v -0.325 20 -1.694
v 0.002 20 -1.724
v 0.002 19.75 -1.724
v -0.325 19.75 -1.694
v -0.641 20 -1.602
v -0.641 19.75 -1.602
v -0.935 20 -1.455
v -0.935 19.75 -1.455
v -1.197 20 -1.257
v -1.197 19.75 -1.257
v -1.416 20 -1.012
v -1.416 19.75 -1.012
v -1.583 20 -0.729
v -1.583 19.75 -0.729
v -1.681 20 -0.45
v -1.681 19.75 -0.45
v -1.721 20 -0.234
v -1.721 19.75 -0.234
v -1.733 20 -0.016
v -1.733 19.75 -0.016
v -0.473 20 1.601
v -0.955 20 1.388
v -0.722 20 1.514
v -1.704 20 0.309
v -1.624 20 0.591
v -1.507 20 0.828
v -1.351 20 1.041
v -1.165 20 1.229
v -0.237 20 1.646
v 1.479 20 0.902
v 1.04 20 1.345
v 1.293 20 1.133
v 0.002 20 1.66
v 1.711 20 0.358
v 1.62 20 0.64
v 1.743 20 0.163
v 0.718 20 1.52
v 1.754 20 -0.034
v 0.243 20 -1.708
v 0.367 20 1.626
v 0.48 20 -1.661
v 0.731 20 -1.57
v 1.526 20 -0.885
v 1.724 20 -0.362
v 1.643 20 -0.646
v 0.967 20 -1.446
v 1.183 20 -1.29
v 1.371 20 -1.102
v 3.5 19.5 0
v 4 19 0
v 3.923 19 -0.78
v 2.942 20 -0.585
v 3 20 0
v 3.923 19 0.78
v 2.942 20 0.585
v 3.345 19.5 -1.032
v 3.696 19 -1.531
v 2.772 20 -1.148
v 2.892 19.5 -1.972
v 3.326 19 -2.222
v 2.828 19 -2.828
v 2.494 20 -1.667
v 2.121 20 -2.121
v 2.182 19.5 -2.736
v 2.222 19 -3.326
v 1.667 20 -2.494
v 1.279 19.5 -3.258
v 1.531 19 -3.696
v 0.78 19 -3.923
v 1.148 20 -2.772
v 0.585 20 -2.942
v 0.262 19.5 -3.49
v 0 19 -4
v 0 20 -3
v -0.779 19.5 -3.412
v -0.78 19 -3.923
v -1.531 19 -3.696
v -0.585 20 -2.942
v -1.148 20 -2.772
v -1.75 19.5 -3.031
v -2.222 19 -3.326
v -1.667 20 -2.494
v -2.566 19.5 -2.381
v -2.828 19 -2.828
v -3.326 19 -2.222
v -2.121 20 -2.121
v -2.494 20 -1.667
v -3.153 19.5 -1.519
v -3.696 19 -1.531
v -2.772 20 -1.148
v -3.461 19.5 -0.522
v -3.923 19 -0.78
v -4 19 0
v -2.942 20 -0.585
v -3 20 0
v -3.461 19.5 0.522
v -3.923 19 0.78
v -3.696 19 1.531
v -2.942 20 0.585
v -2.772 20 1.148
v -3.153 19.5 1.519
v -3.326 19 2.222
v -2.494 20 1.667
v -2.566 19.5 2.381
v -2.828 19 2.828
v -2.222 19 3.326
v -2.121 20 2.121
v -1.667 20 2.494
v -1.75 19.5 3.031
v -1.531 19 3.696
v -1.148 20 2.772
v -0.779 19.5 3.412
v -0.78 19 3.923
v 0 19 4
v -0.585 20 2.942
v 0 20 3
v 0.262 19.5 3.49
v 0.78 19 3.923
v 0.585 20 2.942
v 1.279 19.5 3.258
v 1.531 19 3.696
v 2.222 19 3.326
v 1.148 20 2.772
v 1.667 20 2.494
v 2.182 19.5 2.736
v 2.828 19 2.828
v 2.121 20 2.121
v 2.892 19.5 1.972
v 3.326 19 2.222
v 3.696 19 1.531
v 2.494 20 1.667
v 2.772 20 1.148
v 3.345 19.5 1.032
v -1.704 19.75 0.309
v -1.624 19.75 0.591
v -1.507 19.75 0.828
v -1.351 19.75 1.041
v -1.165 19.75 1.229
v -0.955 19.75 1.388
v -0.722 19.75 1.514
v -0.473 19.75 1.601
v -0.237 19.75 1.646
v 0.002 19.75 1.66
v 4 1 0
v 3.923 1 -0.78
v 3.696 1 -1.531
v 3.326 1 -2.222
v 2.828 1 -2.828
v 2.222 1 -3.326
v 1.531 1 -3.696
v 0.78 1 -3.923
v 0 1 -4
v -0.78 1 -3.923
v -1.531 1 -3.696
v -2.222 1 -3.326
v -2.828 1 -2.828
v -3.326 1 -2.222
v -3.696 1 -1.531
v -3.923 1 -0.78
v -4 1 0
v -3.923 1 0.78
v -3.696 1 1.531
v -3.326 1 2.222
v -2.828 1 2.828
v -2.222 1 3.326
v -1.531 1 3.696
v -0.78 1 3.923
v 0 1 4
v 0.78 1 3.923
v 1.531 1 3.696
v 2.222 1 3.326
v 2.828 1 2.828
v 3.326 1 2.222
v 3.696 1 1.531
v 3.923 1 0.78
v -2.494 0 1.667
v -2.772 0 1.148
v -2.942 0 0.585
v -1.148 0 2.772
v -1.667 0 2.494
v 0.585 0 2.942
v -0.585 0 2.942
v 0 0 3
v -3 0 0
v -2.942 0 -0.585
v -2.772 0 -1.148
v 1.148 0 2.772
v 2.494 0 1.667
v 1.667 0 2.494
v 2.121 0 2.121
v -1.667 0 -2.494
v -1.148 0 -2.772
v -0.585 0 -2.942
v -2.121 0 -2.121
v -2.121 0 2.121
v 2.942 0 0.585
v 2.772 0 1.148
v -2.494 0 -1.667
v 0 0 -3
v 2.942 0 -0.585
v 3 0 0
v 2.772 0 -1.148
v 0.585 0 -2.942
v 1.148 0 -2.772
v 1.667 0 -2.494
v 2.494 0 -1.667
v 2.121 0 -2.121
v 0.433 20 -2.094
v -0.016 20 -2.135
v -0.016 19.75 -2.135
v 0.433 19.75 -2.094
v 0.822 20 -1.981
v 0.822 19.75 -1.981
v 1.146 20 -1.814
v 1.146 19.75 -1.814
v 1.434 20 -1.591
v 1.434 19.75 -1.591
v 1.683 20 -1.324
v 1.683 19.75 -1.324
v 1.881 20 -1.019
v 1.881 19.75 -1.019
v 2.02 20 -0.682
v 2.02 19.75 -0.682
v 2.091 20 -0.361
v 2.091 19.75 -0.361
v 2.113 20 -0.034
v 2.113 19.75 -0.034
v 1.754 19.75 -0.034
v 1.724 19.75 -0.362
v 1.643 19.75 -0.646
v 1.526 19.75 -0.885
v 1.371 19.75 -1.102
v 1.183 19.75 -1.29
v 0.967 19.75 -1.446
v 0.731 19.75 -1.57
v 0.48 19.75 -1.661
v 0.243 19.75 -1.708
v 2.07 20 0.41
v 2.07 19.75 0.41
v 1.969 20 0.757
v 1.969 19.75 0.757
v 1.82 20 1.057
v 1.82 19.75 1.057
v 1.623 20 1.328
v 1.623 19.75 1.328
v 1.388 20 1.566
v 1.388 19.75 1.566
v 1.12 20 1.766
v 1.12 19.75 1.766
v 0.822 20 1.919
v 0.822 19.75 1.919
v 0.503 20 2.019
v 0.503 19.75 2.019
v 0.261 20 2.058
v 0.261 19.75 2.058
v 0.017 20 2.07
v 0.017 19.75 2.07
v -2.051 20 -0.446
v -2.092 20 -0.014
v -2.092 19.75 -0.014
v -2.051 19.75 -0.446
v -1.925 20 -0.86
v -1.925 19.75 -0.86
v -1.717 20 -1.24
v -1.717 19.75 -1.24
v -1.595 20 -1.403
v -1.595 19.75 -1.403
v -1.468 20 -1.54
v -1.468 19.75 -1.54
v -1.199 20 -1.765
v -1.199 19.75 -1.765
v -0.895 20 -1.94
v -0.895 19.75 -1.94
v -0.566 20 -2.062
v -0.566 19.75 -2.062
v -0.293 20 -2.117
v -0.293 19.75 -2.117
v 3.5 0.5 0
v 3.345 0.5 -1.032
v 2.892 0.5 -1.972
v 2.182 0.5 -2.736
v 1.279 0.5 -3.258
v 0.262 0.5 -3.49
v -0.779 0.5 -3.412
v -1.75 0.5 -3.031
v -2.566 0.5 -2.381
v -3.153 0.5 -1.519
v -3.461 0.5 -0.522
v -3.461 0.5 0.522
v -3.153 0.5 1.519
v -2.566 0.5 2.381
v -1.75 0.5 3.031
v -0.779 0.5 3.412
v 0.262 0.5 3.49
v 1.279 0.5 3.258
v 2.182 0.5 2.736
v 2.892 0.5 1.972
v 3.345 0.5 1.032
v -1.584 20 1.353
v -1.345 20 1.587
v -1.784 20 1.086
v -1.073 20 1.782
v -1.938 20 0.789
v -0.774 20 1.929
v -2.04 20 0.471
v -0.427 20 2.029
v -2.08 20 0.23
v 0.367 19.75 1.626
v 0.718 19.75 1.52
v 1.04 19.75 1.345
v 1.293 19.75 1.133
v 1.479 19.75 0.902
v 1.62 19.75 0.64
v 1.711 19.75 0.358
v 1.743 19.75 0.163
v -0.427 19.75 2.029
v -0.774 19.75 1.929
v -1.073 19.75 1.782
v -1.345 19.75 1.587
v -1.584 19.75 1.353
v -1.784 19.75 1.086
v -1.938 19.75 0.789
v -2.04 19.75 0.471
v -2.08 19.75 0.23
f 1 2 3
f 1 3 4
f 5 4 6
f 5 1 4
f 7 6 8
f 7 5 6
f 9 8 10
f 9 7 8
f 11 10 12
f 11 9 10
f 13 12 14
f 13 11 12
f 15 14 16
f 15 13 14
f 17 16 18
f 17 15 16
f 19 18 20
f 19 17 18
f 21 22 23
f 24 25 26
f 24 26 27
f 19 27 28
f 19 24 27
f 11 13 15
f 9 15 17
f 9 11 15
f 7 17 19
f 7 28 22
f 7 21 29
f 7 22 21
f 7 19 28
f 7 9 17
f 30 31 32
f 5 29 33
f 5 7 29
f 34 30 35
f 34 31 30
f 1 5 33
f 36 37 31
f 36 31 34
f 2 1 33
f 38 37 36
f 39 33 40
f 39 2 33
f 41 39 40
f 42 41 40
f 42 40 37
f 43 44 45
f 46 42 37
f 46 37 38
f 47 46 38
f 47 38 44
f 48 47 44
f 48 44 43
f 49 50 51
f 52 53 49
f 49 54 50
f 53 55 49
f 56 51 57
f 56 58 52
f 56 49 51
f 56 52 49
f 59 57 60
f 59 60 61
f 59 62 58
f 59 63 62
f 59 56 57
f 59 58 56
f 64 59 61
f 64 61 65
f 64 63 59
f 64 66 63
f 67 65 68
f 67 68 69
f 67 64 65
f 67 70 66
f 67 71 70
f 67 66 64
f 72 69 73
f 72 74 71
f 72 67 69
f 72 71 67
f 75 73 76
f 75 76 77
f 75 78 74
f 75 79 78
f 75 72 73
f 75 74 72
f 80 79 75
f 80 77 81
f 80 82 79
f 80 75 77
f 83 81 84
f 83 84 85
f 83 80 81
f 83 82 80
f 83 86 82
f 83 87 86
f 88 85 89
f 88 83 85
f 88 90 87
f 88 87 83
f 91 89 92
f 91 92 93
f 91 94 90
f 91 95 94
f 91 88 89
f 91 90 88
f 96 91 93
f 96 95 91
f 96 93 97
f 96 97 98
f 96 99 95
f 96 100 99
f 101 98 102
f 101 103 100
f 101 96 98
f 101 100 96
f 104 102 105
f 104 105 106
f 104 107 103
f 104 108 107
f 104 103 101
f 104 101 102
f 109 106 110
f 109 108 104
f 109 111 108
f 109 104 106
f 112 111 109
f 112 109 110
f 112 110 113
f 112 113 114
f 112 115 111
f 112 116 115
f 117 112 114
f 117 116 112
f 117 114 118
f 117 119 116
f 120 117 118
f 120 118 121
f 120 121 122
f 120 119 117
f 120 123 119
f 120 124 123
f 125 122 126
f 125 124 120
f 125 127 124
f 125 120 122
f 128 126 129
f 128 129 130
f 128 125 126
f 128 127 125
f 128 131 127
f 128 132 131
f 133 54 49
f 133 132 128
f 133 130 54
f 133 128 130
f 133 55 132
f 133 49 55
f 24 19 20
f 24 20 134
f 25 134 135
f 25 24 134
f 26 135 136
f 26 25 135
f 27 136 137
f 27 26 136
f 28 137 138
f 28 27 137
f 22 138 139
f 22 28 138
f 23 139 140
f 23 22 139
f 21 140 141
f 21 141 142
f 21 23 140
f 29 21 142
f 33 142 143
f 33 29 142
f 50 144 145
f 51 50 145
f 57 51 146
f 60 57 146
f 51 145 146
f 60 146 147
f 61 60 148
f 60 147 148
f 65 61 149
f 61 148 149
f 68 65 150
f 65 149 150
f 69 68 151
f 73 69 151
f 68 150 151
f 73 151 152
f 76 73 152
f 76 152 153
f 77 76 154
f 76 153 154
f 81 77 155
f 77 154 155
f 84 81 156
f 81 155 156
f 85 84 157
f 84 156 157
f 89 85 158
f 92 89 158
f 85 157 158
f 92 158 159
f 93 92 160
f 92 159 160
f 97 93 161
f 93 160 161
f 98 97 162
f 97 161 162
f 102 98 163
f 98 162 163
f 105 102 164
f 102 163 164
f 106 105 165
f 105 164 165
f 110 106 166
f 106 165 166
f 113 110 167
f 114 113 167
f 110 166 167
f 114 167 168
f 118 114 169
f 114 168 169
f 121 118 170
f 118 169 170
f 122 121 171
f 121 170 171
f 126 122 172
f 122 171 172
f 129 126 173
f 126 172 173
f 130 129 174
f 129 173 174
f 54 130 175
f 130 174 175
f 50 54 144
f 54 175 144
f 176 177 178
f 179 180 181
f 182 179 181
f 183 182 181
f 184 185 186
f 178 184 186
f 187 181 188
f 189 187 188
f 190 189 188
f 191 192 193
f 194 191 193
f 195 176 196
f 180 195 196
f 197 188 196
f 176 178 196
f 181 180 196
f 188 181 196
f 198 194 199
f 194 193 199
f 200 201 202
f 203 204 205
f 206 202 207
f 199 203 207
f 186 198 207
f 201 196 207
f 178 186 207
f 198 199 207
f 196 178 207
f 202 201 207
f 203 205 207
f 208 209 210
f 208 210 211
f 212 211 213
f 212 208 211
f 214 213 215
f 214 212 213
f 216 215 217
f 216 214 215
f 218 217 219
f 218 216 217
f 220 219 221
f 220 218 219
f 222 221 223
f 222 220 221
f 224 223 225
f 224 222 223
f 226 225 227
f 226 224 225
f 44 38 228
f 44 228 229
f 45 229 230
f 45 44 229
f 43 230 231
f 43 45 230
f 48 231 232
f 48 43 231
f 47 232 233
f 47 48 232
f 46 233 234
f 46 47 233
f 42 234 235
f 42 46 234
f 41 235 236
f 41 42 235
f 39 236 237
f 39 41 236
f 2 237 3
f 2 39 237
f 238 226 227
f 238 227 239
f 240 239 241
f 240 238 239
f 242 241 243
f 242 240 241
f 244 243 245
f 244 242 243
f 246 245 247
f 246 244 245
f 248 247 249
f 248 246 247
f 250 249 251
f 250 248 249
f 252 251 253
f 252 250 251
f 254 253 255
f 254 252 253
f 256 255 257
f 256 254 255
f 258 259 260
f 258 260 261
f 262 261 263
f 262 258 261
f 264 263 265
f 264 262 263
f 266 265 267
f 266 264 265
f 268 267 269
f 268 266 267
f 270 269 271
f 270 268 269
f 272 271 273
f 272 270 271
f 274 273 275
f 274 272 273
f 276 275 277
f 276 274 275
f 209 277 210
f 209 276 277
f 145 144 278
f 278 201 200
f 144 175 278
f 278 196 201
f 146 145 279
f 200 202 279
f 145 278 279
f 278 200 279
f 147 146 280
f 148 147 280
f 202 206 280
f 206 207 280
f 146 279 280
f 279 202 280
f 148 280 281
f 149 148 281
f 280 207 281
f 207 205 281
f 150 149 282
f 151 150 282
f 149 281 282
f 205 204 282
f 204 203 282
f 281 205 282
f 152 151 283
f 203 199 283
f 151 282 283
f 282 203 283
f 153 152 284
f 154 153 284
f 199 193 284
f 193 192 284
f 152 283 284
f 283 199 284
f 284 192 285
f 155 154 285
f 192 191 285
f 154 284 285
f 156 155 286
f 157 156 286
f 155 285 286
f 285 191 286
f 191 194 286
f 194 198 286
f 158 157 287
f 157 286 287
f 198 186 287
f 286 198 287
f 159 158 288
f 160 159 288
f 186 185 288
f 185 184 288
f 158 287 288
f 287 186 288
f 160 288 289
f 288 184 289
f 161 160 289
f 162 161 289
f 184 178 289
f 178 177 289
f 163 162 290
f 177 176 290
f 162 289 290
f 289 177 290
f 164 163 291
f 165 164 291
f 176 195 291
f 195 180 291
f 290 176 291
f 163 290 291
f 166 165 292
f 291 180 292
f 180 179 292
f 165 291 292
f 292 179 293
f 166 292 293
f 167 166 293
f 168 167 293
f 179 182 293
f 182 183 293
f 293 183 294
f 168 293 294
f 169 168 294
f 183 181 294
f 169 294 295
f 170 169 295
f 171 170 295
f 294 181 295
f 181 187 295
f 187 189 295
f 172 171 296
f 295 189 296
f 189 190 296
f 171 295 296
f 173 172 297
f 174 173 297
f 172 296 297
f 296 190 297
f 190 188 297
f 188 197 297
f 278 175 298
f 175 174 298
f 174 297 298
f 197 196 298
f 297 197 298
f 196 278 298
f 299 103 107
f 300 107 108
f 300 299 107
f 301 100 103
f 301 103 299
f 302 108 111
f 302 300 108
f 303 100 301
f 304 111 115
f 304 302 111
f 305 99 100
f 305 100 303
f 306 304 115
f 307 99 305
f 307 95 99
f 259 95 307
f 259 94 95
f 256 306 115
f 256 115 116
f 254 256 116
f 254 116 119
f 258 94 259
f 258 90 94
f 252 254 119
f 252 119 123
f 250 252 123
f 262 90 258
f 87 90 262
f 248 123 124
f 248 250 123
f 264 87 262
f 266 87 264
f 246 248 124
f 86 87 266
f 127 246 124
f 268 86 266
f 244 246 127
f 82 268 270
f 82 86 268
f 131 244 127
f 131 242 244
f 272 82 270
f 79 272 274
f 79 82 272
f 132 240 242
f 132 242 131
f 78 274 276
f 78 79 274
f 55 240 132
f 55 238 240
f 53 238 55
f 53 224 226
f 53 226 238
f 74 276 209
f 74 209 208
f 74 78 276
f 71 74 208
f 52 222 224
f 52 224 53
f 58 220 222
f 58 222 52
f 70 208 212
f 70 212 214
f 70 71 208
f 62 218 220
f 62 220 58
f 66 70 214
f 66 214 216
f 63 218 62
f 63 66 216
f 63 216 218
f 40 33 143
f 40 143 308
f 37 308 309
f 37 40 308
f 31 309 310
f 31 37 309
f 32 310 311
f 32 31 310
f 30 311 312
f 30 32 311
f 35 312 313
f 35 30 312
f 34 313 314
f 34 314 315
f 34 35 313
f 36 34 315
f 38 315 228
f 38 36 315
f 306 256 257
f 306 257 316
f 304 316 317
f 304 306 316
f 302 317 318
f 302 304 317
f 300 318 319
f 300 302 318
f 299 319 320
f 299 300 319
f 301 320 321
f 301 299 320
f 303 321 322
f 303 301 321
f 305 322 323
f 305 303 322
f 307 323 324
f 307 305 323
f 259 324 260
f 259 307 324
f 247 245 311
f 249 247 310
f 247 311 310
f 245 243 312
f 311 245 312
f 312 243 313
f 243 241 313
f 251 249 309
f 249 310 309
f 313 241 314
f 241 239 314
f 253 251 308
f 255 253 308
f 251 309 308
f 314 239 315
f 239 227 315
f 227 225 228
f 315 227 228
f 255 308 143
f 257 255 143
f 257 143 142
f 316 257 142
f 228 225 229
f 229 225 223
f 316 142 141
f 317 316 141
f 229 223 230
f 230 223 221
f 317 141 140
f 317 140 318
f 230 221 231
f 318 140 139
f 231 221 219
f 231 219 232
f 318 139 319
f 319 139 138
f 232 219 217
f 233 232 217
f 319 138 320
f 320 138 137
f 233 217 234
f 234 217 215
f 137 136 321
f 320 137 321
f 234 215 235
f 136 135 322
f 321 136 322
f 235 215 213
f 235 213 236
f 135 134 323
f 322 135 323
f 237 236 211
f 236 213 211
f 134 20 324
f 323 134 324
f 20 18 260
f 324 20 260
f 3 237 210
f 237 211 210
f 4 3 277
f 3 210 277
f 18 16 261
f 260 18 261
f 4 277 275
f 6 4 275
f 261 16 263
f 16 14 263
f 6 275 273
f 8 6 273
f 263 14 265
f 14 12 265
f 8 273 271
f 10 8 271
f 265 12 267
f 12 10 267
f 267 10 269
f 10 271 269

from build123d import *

# Parameters (mm, degrees)
CROQUIS1_R              = 4
SALIENTE_EXTRUIR1_DEPTH = 20
CHAFL_N1_SIZE           = 1
CORTAR_EXTRUIR2_DEPTH   = 0.25


with BuildPart() as part:
    # Croquis1 → Saliente-Extruir1 (new body)
    with BuildSketch(Plane(origin=(0, 0, 0), x_dir=(1, 0, 0), z_dir=(0, 1, 0))):
        Circle(CROQUIS1_R)
    extrude(amount=SALIENTE_EXTRUIR1_DEPTH)

    # Chaflán1
    chafl_n1_edges = [part.edges().sort_by_distance(p)[0] for p in [
        (-4, 0, 0),
        (-4, 20, 0),
    ]]
    chamfer(chafl_n1_edges, length=CHAFL_N1_SIZE)

    # Croquis4 → Cortar-Extruir2 (cut)
    with BuildSketch(Plane(origin=(0, 20, 0), x_dir=(1, 0, 0), z_dir=(0, 1, 0))):
        with BuildLine():
            add(Edge.make_bspline(
                [(-0.015518725, 2.134649306), (0.058547681, 2.13277333), (0.204020215, 2.129088757), (0.417820098, 2.100884068), (0.621928779, 2.052089336), (0.818008937, 1.98710307), (1.003715196, 1.900412344), (1.180445359, 1.795629318), (1.347778929, 1.671656222), (1.503460508, 1.529451391), (1.645925594, 1.374727444), (1.771440893, 1.209609832), (1.876632085, 1.035096915), (1.963015842, 0.851713109), (2.030785682, 0.659873146), (2.077550303, 0.458554285), (2.107422475, 0.249060925), (2.110914792, 0.10617308), (2.112686403, 0.033687768)],
                knots=[0, 0, 0, 0, 0.000222163, 0.000436347, 0.000645474, 0.000850973, 0.001054962, 0.001259031, 0.001466406, 0.001678557, 0.001890656, 0.002096587, 0.002299693, 0.002500778, 0.002703768, 0.002908812, 0.003119927, 0.003337287, 0.003337287, 0.003337287, 0.003337287], degree=3))
            add(Edge.make_bspline(
                [(2.112686403, 0.033687768), (2.110915051, -0.0382636), (2.107423512, -0.18008808), (2.077516338, -0.388252016), (2.030612338, -0.588355669), (1.963645177, -0.780064987), (1.877673201, -0.963582203), (1.771781577, -1.138424436), (1.647048765, -1.304649005), (1.505098078, -1.460434908), (1.35035403, -1.60328916), (1.184376582, -1.727767875), (1.010898502, -1.834881161), (0.827687407, -1.920348217), (0.63717308, -1.988658983), (0.437650425, -2.035233417), (0.230054363, -2.065275752), (0.088487501, -2.068725485), (0.016532557, -2.070478899)],
                knots=[0, 0, 0, 0, 0.000215759, 0.000425286, 0.000629551, 0.00083152, 0.00103333, 0.001236435, 0.001443647, 0.001655798, 0.001867897, 0.002074468, 0.002277305, 0.00247839, 0.002679869, 0.002883353, 0.003092087, 0.003307846, 0.003307846, 0.003307846, 0.003307846], degree=3))
            add(Edge.make_bspline(
                [(0.016532557, -2.070478899), (-0.055952379, -2.068708171), (-0.198839483, -2.065217595), (-0.408596095, -2.03529599), (-0.610056374, -1.988505928), (-0.802644204, -1.921638001), (-0.98646698, -1.835218309), (-1.161884218, -1.729841876), (-1.328191815, -1.604805143), (-1.484010953, -1.462900486), (-1.626581466, -1.308418712), (-1.750877895, -1.142893849), (-1.856278024, -0.969573328), (-1.942407547, -0.787976157), (-2.010595501, -0.598980223), (-2.057115293, -0.40132482), (-2.087213524, -0.196136813), (-2.09068192, -0.056430644), (-2.092441802, 0.014456999)],
                knots=[0, 0, 0, 0, 0.00021736, 0.000428475, 0.000634298, 0.000837024, 0.001038834, 0.001242626, 0.001449838, 0.001661989, 0.001874088, 0.002079537, 0.002281957, 0.002481593, 0.002681563, 0.002883489, 0.003089842, 0.003302399, 0.003302399, 0.003302399, 0.003302399], degree=3))
            add(Edge.make_bspline(
                [(-2.092441802, 0.014456999), (-2.09183079, 0.062037192), (-2.090616474, 0.156597333), (-2.075997397, 0.297016305), (-2.054784025, 0.435177056), (-2.024381839, 0.570686711), (-1.984619934, 0.703213551), (-1.937703331, 0.833671565), (-1.88040065, 0.960738678), (-1.815622767, 1.08501684), (-1.743323558, 1.204568733), (-1.663465558, 1.317573971), (-1.578853709, 1.424980824), (-1.486095545, 1.524005971), (-1.388248179, 1.61753015), (-1.283724318, 1.704116112), (-1.173161753, 1.784544628), (-1.056084748, 1.857025017), (-0.935378148, 1.922578314), (-0.810947544, 1.978831858), (-0.684482891, 2.027113071), (-0.555391865, 2.066245443), (-0.424017268, 2.097139198), (-0.290072372, 2.118176174), (-0.153663885, 2.132832537), (-0.061765234, 2.134041111), (-0.015518725, 2.134649306)],
                knots=[0, 0, 0, 0, 0.000142684, 0.000283569, 0.000423077, 0.000561875, 0.000699793, 0.000837942, 0.000977471, 0.001117606, 0.001258187, 0.001396235, 0.001532512, 0.001668024, 0.001802915, 0.001938339, 0.002074896, 0.002212747, 0.002351135, 0.002486682, 0.002622105, 0.002756954, 0.002891065, 0.003026617, 0.003163515, 0.003302194, 0.003302194, 0.003302194, 0.003302194], degree=3))
        make_face()
        with BuildLine():
            add(Edge.make_bspline(
                [(0.00210948, 1.724392896), (-0.035850101, 1.723930164), (-0.111406368, 1.723009125), (-0.223731552, 1.710876878), (-0.334579476, 1.693585577), (-0.443973033, 1.668920981), (-0.551454507, 1.63531635), (-0.658025754, 1.596641026), (-0.762714958, 1.549531208), (-0.86517651, 1.49630526), (-0.964508024, 1.437392208), (-1.058236826, 1.372281617), (-1.146605562, 1.302500412), (-1.229397867, 1.227885741), (-1.306370635, 1.148057625), (-1.379038865, 1.064226269), (-1.444489816, 0.973995536), (-1.504473332, 0.879812214), (-1.558150864, 0.781798979), (-1.605882698, 0.680987707), (-1.644927279, 0.576556065), (-1.676769995, 0.469637028), (-1.703169779, 0.360399931), (-1.719894263, 0.248016104), (-1.732159817, 0.133050262), (-1.733028212, 0.055356714), (-1.733467443, 0.016059563)],
                knots=[0, 0, 0, 0, 0.000113827, 0.000226566, 0.000338539, 0.000450309, 0.000562594, 0.000676167, 0.000790231, 0.000906707, 0.001022414, 0.001136438, 0.001248815, 0.001360011, 0.00147051, 0.001581322, 0.001692547, 0.001804581, 0.001916109, 0.00202759, 0.002138911, 0.002250197, 0.002362147, 0.002475703, 0.002590835, 0.002708667, 0.002708667, 0.002708667, 0.002708667], degree=3))
            add(Edge.make_bspline(
                [(-1.733467443, 0.016059563), (-1.732010458, -0.041725833), (-1.729144118, -0.155407581), (-1.704049752, -0.321999746), (-1.665396067, -0.482100645), (-1.608416219, -0.634834255), (-1.537158374, -0.781513436), (-1.449127642, -0.920836984), (-1.344831545, -1.052842554), (-1.226358943, -1.176608576), (-1.096847278, -1.28957521), (-0.959324158, -1.388733391), (-0.815262892, -1.472630819), (-0.664287804, -1.540979473), (-0.507204902, -1.595139174), (-0.343001986, -1.632257609), (-0.17277289, -1.656686701), (-0.056737855, -1.659032708), (0.00210948, -1.660222489)],
                knots=[0, 0, 0, 0, 0.000173262, 0.000340861, 0.0005043, 0.000666548, 0.000828884, 0.000992726, 0.001159918, 0.001332774, 0.001505994, 0.001674777, 0.001840658, 0.002005251, 0.002171224, 0.002338187, 0.002509641, 0.002686071, 0.002686071, 0.002686071, 0.002686071], degree=3))
            add(Edge.make_bspline(
                [(0.00210948, -1.660222489), (0.041663196, -1.659679055), (0.120110095, -1.658601263), (0.236790692, -1.647745632), (0.351369219, -1.630337782), (0.463684968, -1.605274175), (0.573610466, -1.573905939), (0.681604527, -1.536639965), (0.786516859, -1.49014716), (0.889670959, -1.438778073), (0.988409521, -1.380217893), (1.082667272, -1.31731715), (1.170068392, -1.247638727), (1.25279876, -1.174132655), (1.330087547, -1.095316829), (1.4014121, -1.011293718), (1.466532251, -0.921532967), (1.52649299, -0.827492504), (1.579982434, -0.729211072), (1.626587118, -0.628034297), (1.666125536, -0.524211315), (1.698043828, -0.417592376), (1.723055784, -0.308379978), (1.740289978, -0.196427888), (1.752345336, -0.081960068), (1.753253996, -0.004538519), (1.753712044, 0.03448905)],
                knots=[0, 0, 0, 0, 0.000118633, 0.000235285, 0.000351216, 0.000466113, 0.00058025, 0.000694035, 0.000808509, 0.000924255, 0.001039553, 0.001152673, 0.001263924, 0.001374585, 0.00148451, 0.001594802, 0.001704908, 0.001816941, 0.001929172, 0.002040317, 0.002150888, 0.002262174, 0.002373943, 0.002486708, 0.002601839, 0.00271887, 0.00271887, 0.00271887, 0.00271887], degree=3))
            add(Edge.make_bspline(
                [(1.753712044, 0.03448905), (1.753253629, 0.073249626), (1.752344279, 0.150138369), (1.740295736, 0.263807876), (1.723037576, 0.374954403), (1.69816591, 0.483141607), (1.666108591, 0.588397064), (1.626580213, 0.690621918), (1.579968443, 0.790196999), (1.526473329, 0.886876195), (1.466340959, 0.979647324), (1.400633253, 1.068335796), (1.328215712, 1.151276071), (1.251157398, 1.230515722), (1.167533529, 1.304364738), (1.077722907, 1.372847619), (0.982815847, 1.437617076), (0.882327578, 1.496046289), (0.778620202, 1.550005412), (0.67220425, 1.59623513), (0.564285279, 1.635517552), (0.455137722, 1.669022655), (0.34384289, 1.693488975), (0.2311528, 1.710892461), (0.117223361, 1.723004902), (0.040602539, 1.723928763), (0.00210948, 1.724392896)],
                knots=[0, 0, 0, 0, 0.00011623, 0.000230564, 0.000342537, 0.000453525, 0.000563278, 0.000672352, 0.000782043, 0.000892869, 0.001003554, 0.00111349, 0.001223695, 0.001333619, 0.001444879, 0.001558028, 0.00167226, 0.001789346, 0.001906533, 0.002022797, 0.002137122, 0.002250941, 0.002365055, 0.002478611, 0.002592945, 0.002708374, 0.002708374, 0.002708374, 0.002708374], degree=3))
        make_face(mode=Mode.SUBTRACT)
    extrude(amount=-CORTAR_EXTRUIR2_DEPTH, mode=Mode.SUBTRACT)


solid = part.part
